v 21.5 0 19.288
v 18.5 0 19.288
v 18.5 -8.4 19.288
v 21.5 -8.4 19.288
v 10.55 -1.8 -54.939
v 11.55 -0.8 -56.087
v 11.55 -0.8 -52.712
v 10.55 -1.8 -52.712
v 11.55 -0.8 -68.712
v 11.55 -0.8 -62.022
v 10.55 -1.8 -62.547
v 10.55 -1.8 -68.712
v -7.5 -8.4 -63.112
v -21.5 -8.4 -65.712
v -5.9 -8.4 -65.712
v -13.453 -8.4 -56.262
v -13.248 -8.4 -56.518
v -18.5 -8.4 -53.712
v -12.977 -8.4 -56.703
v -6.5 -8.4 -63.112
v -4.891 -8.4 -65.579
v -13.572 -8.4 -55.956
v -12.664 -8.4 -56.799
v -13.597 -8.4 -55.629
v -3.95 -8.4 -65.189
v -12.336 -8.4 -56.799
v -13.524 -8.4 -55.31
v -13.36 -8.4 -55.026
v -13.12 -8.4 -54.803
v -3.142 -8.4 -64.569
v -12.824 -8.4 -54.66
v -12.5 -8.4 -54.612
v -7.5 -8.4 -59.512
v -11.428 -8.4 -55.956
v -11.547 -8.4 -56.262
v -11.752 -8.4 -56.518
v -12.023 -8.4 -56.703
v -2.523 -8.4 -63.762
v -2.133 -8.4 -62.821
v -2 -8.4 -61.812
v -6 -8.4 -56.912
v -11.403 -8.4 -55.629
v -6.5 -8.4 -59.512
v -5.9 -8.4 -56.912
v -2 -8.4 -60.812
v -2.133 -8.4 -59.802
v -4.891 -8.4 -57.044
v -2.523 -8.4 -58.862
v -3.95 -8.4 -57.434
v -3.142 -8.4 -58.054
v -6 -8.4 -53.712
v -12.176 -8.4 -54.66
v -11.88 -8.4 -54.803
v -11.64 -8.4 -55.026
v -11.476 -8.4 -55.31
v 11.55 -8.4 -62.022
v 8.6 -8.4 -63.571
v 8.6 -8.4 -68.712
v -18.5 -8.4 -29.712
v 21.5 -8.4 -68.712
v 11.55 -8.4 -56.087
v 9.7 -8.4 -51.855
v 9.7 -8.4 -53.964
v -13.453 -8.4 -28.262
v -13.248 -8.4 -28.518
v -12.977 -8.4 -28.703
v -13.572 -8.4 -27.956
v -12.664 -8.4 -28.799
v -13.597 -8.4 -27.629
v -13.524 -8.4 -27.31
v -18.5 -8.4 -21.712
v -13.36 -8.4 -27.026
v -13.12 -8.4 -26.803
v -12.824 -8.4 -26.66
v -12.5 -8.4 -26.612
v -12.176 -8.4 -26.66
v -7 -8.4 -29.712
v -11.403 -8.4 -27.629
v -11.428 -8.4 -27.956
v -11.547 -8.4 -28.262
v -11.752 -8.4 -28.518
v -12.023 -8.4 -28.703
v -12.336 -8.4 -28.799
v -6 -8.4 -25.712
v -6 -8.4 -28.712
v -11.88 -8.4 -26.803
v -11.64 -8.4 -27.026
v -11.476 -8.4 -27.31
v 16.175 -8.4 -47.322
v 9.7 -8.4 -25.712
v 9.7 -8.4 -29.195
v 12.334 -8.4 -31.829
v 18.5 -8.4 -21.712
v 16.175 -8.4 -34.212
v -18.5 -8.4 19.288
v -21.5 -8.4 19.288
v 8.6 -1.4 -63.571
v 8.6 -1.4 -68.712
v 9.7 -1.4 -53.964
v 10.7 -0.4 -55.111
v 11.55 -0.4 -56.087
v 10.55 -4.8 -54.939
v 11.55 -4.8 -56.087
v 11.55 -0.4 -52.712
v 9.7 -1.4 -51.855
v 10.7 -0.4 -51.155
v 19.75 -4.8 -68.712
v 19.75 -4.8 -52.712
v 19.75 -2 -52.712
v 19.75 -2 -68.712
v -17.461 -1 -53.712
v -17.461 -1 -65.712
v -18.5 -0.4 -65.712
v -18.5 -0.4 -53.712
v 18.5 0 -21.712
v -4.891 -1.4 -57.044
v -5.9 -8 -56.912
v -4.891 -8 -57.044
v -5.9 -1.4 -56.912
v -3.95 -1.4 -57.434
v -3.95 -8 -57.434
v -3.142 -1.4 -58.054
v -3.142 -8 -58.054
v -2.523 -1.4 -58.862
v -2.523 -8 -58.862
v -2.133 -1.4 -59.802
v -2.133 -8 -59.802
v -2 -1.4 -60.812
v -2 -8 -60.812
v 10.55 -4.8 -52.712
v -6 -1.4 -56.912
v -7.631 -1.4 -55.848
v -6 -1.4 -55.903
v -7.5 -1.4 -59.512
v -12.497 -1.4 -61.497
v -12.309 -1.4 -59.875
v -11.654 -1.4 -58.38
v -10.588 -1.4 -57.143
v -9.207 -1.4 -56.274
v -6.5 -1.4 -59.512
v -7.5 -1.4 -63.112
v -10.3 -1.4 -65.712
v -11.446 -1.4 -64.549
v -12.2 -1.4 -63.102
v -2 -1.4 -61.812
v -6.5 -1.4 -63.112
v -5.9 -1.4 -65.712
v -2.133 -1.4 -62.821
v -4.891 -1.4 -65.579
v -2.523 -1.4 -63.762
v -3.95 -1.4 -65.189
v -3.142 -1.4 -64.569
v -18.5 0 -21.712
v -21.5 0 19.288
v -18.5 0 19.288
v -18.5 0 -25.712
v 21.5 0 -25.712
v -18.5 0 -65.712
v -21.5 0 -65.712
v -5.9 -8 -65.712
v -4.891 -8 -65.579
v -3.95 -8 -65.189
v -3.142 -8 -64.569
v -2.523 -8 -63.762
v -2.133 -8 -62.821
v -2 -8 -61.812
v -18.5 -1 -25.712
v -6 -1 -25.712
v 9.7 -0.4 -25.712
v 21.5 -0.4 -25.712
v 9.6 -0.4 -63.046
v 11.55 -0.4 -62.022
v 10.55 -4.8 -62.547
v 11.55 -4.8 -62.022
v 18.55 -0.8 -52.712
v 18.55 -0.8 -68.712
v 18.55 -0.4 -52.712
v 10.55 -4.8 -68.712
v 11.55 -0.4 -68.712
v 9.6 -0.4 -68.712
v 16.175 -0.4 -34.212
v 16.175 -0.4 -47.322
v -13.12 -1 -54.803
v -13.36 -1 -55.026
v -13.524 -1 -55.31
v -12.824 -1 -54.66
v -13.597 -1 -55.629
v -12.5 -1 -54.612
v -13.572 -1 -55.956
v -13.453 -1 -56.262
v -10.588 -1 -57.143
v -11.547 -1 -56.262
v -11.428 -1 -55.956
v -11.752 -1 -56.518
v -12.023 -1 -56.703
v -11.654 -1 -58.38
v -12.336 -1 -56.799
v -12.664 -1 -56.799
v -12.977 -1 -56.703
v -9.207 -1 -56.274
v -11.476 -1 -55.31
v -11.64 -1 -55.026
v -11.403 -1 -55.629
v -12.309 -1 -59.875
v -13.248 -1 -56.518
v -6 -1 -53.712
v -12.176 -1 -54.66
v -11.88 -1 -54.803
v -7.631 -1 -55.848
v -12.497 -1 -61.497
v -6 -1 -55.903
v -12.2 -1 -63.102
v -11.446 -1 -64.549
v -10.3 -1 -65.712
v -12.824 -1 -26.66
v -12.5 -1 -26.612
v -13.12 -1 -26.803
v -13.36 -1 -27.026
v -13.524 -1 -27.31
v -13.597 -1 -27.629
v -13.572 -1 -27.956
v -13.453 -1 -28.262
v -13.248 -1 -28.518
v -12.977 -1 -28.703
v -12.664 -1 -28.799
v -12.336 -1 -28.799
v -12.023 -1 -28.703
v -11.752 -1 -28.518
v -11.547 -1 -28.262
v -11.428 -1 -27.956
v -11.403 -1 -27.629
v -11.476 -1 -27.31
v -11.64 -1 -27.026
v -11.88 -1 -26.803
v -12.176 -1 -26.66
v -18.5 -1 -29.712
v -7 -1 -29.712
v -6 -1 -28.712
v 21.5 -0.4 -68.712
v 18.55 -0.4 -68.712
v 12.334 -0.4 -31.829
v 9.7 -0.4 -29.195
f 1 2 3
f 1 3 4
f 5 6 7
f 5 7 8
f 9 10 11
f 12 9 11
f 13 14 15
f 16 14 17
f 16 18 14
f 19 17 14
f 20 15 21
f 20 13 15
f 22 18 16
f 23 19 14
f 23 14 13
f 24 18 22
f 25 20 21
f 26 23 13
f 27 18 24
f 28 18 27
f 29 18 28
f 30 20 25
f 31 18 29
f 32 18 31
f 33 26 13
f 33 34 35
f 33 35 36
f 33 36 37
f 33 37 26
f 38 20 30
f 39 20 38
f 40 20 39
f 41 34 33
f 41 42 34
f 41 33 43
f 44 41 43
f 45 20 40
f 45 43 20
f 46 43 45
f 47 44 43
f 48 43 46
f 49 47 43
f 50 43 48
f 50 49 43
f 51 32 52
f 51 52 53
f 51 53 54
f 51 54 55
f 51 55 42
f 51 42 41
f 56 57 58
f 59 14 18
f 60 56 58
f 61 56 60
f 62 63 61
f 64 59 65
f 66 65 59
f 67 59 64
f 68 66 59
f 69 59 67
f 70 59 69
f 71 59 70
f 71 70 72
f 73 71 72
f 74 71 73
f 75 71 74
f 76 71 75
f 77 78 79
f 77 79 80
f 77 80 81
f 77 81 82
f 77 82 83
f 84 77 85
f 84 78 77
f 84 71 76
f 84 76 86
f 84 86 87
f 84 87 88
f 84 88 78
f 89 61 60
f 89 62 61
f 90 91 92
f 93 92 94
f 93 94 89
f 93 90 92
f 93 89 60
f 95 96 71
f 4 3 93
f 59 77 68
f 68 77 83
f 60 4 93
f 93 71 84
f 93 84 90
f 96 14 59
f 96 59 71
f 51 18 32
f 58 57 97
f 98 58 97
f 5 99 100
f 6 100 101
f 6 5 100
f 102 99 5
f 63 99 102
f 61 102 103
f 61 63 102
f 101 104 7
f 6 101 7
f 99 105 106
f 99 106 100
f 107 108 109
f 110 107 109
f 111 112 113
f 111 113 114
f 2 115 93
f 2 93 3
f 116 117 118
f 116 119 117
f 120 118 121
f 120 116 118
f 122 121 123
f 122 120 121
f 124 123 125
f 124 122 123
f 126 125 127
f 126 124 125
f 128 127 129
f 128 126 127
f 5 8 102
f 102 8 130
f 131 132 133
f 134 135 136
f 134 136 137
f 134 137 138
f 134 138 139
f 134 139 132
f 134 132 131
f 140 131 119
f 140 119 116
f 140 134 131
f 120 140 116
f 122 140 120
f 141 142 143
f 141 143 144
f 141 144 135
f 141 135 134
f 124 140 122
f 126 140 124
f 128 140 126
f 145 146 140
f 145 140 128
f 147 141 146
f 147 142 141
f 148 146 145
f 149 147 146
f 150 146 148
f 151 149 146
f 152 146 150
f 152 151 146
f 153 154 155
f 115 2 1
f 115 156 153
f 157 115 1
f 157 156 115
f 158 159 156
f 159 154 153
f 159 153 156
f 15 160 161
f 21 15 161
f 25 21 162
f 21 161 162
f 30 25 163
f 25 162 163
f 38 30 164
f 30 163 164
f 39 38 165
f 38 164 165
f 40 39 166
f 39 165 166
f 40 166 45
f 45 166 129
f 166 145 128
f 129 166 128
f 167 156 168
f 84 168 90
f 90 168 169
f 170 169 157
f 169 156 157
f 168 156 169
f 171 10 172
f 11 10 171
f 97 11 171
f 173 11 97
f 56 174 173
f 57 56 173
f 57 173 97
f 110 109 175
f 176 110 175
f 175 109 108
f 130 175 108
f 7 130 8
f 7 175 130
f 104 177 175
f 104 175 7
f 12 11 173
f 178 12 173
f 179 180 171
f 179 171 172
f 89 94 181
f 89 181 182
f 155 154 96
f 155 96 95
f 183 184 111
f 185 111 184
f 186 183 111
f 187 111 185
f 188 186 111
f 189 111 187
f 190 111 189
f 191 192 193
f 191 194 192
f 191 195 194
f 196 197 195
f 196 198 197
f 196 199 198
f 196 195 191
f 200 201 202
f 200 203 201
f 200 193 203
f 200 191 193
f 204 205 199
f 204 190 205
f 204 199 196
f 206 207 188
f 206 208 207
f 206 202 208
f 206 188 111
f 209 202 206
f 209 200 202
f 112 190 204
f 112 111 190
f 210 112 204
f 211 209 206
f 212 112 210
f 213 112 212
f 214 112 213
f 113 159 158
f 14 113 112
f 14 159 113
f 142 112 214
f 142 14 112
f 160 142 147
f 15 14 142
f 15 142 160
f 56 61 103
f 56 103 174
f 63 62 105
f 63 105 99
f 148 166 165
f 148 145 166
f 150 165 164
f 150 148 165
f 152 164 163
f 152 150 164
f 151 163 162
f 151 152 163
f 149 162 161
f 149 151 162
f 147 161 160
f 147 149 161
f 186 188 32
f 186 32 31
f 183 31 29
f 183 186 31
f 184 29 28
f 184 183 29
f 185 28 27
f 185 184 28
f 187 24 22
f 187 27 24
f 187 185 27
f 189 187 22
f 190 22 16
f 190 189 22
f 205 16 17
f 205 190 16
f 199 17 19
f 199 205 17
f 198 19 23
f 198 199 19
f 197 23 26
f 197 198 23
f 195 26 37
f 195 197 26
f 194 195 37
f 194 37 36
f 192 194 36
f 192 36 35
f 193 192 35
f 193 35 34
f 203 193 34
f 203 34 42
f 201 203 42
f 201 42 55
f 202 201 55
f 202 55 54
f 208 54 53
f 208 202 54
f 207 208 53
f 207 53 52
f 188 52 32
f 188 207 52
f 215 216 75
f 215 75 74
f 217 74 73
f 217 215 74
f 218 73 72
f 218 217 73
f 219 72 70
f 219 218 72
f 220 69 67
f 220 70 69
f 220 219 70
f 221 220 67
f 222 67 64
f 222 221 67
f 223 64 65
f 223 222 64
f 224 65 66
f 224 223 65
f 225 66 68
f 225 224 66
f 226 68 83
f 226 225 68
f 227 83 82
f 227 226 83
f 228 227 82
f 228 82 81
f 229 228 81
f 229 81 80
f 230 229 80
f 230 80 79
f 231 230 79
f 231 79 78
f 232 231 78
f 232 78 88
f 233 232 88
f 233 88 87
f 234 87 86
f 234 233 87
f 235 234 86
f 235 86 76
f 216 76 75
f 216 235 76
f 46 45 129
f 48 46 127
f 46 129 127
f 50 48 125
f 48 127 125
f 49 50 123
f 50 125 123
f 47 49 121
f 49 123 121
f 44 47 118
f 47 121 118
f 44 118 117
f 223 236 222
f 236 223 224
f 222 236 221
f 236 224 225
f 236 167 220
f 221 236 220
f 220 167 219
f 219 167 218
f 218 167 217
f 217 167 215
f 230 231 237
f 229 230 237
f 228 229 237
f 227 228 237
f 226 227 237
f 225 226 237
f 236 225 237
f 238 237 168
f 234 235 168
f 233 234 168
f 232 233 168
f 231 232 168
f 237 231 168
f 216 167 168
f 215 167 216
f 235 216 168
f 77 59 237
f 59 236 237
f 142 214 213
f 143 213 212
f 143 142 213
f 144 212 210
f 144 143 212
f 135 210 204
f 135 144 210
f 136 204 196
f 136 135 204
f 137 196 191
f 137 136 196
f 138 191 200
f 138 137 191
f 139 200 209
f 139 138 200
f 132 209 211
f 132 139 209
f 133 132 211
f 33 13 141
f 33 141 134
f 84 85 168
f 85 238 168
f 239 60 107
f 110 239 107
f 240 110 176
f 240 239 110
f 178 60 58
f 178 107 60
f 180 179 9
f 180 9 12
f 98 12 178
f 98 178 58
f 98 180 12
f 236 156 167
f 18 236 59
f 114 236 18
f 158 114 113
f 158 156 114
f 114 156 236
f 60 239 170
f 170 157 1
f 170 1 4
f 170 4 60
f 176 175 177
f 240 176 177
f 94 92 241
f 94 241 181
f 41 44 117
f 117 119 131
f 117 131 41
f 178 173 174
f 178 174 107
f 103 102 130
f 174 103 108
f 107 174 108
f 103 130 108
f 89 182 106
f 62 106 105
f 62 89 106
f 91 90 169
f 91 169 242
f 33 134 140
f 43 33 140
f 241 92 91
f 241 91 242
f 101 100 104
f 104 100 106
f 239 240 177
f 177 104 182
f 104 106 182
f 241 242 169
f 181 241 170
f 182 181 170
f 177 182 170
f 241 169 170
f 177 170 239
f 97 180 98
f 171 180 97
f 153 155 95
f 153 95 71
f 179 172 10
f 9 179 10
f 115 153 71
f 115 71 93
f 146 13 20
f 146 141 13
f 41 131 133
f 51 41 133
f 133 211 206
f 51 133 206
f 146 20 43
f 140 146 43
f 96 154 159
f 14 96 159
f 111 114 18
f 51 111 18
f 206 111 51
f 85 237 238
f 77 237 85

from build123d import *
from OCP.BRepFilletAPI import BRepFilletAPI_MakeChamfer

# Parameters (mm, degrees)
SKETCH1_W                       = 3
SKETCH1_H                       = 37
SKETCH1_H_2                     = 48
BOSS_EXTRUDE1_DEPTH             = 8
SKETCH4_W                       = 19.5
SKETCH4_H                       = 8.8
BOSS_EXTRUDE3_DEPTH             = 6.6
SERVO_HOLDER_DEPTH              = 0.4
SERVO_HOLDER_DEPTH_BACK         = 7
SKETCH3_W                       = 15.5
SKETCH3_H                       = 4
SKETCH3_R                       = 1.04
SKETCH5_W                       = 1
SKETCH5_H                       = 3.6
CUT_EXTRUDE2_DEPTH              = 70.647801738
SKETCH11_W                      = 43
SKETCH11_H                      = 4
BOSS_EXTRUDE9_DEPTH             = 8
BOSS_EXTRUDE9_DIRECTION_2_REACH = 71.601
SKETCH14_W                      = 12.223643904
SKETCH14_H                      = 44.979564252
CUT_EXTRUDE5_DEPTH              = 10
FILLET2_R                       = 3.9
CUT_EXTRUDE4_DEPTH              = 70.647801738
CUT_EXTRUDE4_DEPTH_BACK         = 70.647801738
SKETCH13_R                      = 1.1
SKETCH17_W                      = 12.9
SKETCH17_H                      = 8
BOSS_EXTRUDE11_DEPTH            = 27
BOSS_EXTRUDE12_DEPTH            = 16
SKETCH18_W                      = 1
SKETCH18_H                      = 3.6
SKETCH18_W_2                    = 3
SKETCH18_H_2                    = 24
SKETCH18_H_3                    = 41
BOSS_EXTRUDE13_DEPTH            = 0.4
CHAMFER14_SIZE                  = 1.2
CUT_EXTRUDE6_DEPTH              = 73.439806169
CUT_EXTRUDE6_DEPTH_BACK         = 73.439806169
SKETCH29_W                      = 8.885937164
SKETCH29_H                      = 8
BOSS_EXTRUDE20_DEPTH            = 0.4
CHAMFER23_SIZE                  = 1
CHAMFER24_SIZE                  = 1
CHAMFER24_SIZE2                 = 3.099667104
SKETCH26_R                      = 5.5
CUT_EXTRUDE8_DEPTH              = 10
CHAMFER25_SIZE                  = 0.6
CHAMFER25_SIZE2                 = 1.039230485


with BuildPart() as part:
    # Sketch1 → Boss-Extrude1 (new body)
    with BuildSketch(Plane(origin=(0, 0, 0), x_dir=(1, 0, 0), z_dir=(0, 1, 0))):
        with Locations((-20, -0.788461538)):
            Rectangle(SKETCH1_W, SKETCH1_H)
        with Locations((-20, 41.711538462)):
            Rectangle(SKETCH1_W, SKETCH1_H_2)
        with Locations((20, -0.788461538)):
            Rectangle(SKETCH1_W, SKETCH1_H)
        with Locations((20, 41.711538462)):
            Rectangle(SKETCH1_W, SKETCH1_H_2)
    extrude(amount=-BOSS_EXTRUDE1_DEPTH)

    # Sketch4 → Boss-Extrude3 (add)
    with BuildSketch(Plane.XZ.offset(8)):
        with Locations((-11.75, -61.311538462)):
            Rectangle(SKETCH4_W, SKETCH4_H)
    extrude(amount=-BOSS_EXTRUDE3_DEPTH)

    # Sketch3 → Servo Holder (add, two sides: drawn at the far end of the back side and taken through both)
    # profile 1 of 2: a face of its own
    with BuildSketch(Plane.XZ.offset(8).offset(-SERVO_HOLDER_DEPTH_BACK)):
        with Locations((-13.75, -55.711538462)):
            Rectangle(SKETCH3_W, SKETCH3_H)
        with Locations(Location((-12.5, -55.711538462, 0), (0, 0, 270))):
            Circle(SKETCH3_R, mode=Mode.SUBTRACT)
    # profile 2 of 2: a face of its own
    with BuildSketch(Plane.XZ.offset(8).offset(-SERVO_HOLDER_DEPTH_BACK)):
        with Locations((-13.75, -27.711538462)):
            Rectangle(SKETCH3_W, SKETCH3_H)
        with Locations(Location((-12.5, -27.711538462, 0), (0, 0, 90))):
            Circle(SKETCH3_R, mode=Mode.SUBTRACT)
    extrude(amount=SERVO_HOLDER_DEPTH + SERVO_HOLDER_DEPTH_BACK)

    # Sketch5 → Cut-Extrude2 (cut, through all)
    with BuildSketch(Plane(origin=(0, 0, 0), x_dir=(1, 0, 0), z_dir=(0, 1, 0))):
        with Locations((-7, 61.311538462)):
            Rectangle(SKETCH5_W, SKETCH5_H)
    extrude(amount=-CUT_EXTRUDE2_DEPTH, mode=Mode.SUBTRACT)

    # Sketch11 → Boss-Extrude9 (add)
    with BuildSketch(Plane.XZ.offset(8)):
        with Locations((0, -23.711538462)):
            Rectangle(SKETCH11_W, SKETCH11_H)
    extrude(amount=-BOSS_EXTRUDE9_DEPTH)

    # Boss-Extrude9 direction 2: up to this face of the body (flat: up to its plane)
    boss_extrude9_direction_2_end = Plane(part.part.faces().sort_by_distance((-13.822479257, -8.4, -55.711538462))[0])
    # Sketch11 → Boss-Extrude9 direction 2 (add, up to the picked face)
    with BuildSketch(Plane.XZ.offset(8), mode=Mode.PRIVATE) as boss_extrude9_direction_2_sk1:
        with Locations((0, -23.711538462)):
            Rectangle(SKETCH11_W, SKETCH11_H)
    boss_extrude9_direction_2_tool1 = split(extrude(boss_extrude9_direction_2_sk1.sketch, amount=BOSS_EXTRUDE9_DIRECTION_2_REACH, mode=Mode.PRIVATE), bisect_by=boss_extrude9_direction_2_end, keep=Keep.BOTH, mode=Mode.PRIVATE)
    add(boss_extrude9_direction_2_tool1.solids().sort_by(Axis((0, -8, -23.711538), (0, -1, 0)))[0])

    # Sketch14 → Cut-Extrude5 (cut)
    with BuildSketch(Plane.XZ.offset(8)):
        with Locations((24.611821952, -48.201320588)):
            Rectangle(SKETCH14_W, SKETCH14_H)
    extrude(amount=-CUT_EXTRUDE5_DEPTH, mode=Mode.SUBTRACT)

    # Fillet2
    fillet2_edges = [part.edges().sort_by_distance(p)[0] for p in [
        (-2, -4.7, -65.711538462),
        (-2, -4.7, -56.911538462),
    ]]
    fillet(fillet2_edges, radius=FILLET2_R)

    # Sketch13 → Cut-Extrude4 (cut, two sides: drawn at the far end of the back side and taken through both)
    with BuildSketch(Plane(origin=(0, -8.4, 0), x_dir=(-1, 0, 0), z_dir=(0, -1, 0)).offset(-CUT_EXTRUDE4_DEPTH_BACK)):
        with Locations(Location((12.5, 55.711538462, 0), (0, 0, 270))):
            Circle(SKETCH13_R)
        with Locations(Location((12.5, 27.711538462, 0), (0, 0, 270))):
            Circle(SKETCH13_R)
    extrude(amount=CUT_EXTRUDE4_DEPTH + CUT_EXTRUDE4_DEPTH_BACK, mode=Mode.SUBTRACT)

    # Sketch17 → Boss-Extrude11 (add)
    with BuildSketch(Plane(origin=(0, 0, -25.711538462), x_dir=(-1, 0, 0), z_dir=(0, 0, -1))):
        with Locations((-15.05, -4.4)):
            Rectangle(SKETCH17_W, SKETCH17_H)
    extrude(amount=BOSS_EXTRUDE11_DEPTH)

    # Sketch16 → Boss-Extrude12 (add)
    with BuildSketch(Plane(origin=(0, 0, -52.711538462), x_dir=(-1, 0, 0), z_dir=(0, 0, -1))):
        Polygon((-19.75, -2), (-18.55, -2), (-18.55, -0.4), (-21.5, -0.4), (-21.5, -8.4), (-8.6, -8.4), (-8.6, -0.4), (-11.55, -0.4), (-11.55, -2), (-10.55, -2), (-10.55, -4.8), (-19.75, -4.8), align=None)
    extrude(amount=BOSS_EXTRUDE12_DEPTH)

    # Sketch18 → Boss-Extrude13 (add)
    # profile 1 of 4: a face of its own
    with BuildSketch(Plane.XZ.offset(8)):
        with BuildLine():
            Line((-21.5, -57.711538462), (-21.5, -65.711538462))
            Line((-21.5, -65.711538462), (-5.9, -65.711538462))
            ThreePointArc((-5.9, -65.711538462), (-3.142283553, -64.569254908), (-2, -61.811538462))
            Line((-2, -61.811538462), (-2, -60.811538462))
            ThreePointArc((-2, -60.811538462), (-3.142283553, -58.053822015), (-5.9, -56.911538462))
            Line((-5.9, -56.911538462), (-6, -56.911538462))
            Line((-6, -56.911538462), (-6, -57.711538462))
            Line((-6, -57.711538462), (-21.5, -57.711538462))
        make_face()
        with Locations((-7, -61.311538462)):
            Rectangle(SKETCH18_W, SKETCH18_H, mode=Mode.SUBTRACT)
    # profile 2 of 4: a face of its own
    with BuildSketch(Plane.XZ.offset(8)):
        with Locations((-20, -41.711538462)):
            Rectangle(SKETCH18_W_2, SKETCH18_H_2)
    # profile 3 of 4: a face of its own
    with BuildSketch(Plane.XZ.offset(8)):
        with Locations((-20, -1.211538462)):
            Rectangle(SKETCH18_W_2, SKETCH18_H_3)
    # profile 4 of 4: a face of its own
    with BuildSketch(Plane.XZ.offset(8)):
        with Locations((20, -1.211538462)):
            Rectangle(SKETCH18_W_2, SKETCH18_H_3)
    extrude(amount=BOSS_EXTRUDE13_DEPTH)

    # Chamfer14
    # the kernel refuses this chamfer: 1.2 mm, written as the material it takes off along each edge
    with BuildSketch(Plane(origin=(18.55, -2, -52.711538462), x_dir=(0.9996219169112968, -0.027495876610586622, 0), z_dir=(0, 0, -1))) as chamfer14_piece_1_section:
        Polygon((CHAMFER14_SIZE * 0.999621916911, -CHAMFER14_SIZE * 0.0274958766106), (-CHAMFER14_SIZE * 0.0274958766106, -CHAMFER14_SIZE * 0.999621916911), (0, 0), align=None)
    chamfer14_piece_1 = extrude(amount=19.086019586, mode=Mode.PRIVATE)
    chamfer14_piece_1 = split(chamfer14_piece_1, bisect_by=Plane(origin=(19.75, -1.603515015, -62.254548254), z_dir=(-1, 0, 0)), keep=Keep.TOP, mode=Mode.PRIVATE)
    add(chamfer14_piece_1, mode=Mode.SUBTRACT)
    with BuildSketch(Plane(origin=(11.55, -2, -52.711538462), x_dir=(0.027495876610585914, 0.9996219169112968, 0), z_dir=(0, 0, -1))) as chamfer14_piece_2_section:
        Polygon((CHAMFER14_SIZE * 0.999621916911, -CHAMFER14_SIZE * 0.0274958766106), (-CHAMFER14_SIZE * 0.0274958766106, -CHAMFER14_SIZE * 0.999621916911), (0, 0), align=None)
    chamfer14_piece_2 = extrude(amount=19.086019586, mode=Mode.PRIVATE)
    chamfer14_piece_2 = split(chamfer14_piece_2, bisect_by=Plane(origin=(10.55, -1.589568171, -62.254548254), z_dir=(1, 0, 0)), keep=Keep.TOP, mode=Mode.PRIVATE)
    add(chamfer14_piece_2, mode=Mode.SUBTRACT)

    # Sketch20 → Cut-Extrude6 (cut, two sides: drawn at the far end of the back side and taken through both)
    with BuildSketch(Plane(origin=(0, -0.4, 0), x_dir=(1, 0, 0), z_dir=(0, 1, 0)).offset(-CUT_EXTRUDE6_DEPTH_BACK)):
        Polygon((8.6, 53.963605621), (8.6, 63.570761525), (2.515498959, 66.765310983), (1.997773223, 58.659131413), (1.997773223, 53.963605621), (4.974693998, 53.963605621), (4.974693998, 55.162371456), (6.687222193, 53.963605621), align=None)
        Polygon((8.6, 52.700948092), (8.6, 53.963605621), (6.687222193, 53.963605621), (8.558718605, 52.653562397), align=None)
        Polygon((16.174786864, 47.322331969), (9.7, 51.854668021), (9.7, 30.195176122), (16.174786864, 34.211808124), align=None)
        Polygon((4.974693998, 53.963605621), (6.687222193, 53.963605621), (4.974693998, 55.162371456), align=None)
        Polygon((11.55, 56.087166011), (11.55, 62.021921145), (8.6, 63.570761525), (8.6, 53.963605621), (9.7, 53.963605621), align=None)
        Polygon((8.6, 52.624665515), (8.6, 52.700948092), (8.558718605, 52.653562397), align=None)
        Polygon((9.7, 25.711538462), (9.7, 30.195176122), (8.6, 29.512791467), (8.6, 25.711538462), align=None)
        Polygon((9.7, 53.963605621), (8.6, 53.963605621), (8.6, 52.700948092), align=None)
        Polygon((9.7, 51.854668021), (9.7, 53.963605621), (8.6, 52.700948092), (8.6, 52.624665515), align=None)
        Polygon((8.558718605, 52.653562397), (6.687222193, 53.963605621), (4.974693998, 53.963605621), (4.974693998, 48.539566347), align=None)
        Polygon((9.7, 30.195176122), (9.7, 51.854668021), (8.6, 52.624665515), (8.6, 29.512791467), align=None)
        Polygon((8.6, 52.624665515), (8.558718605, 52.653562397), (4.974693998, 48.539566347), (4.974693998, 27.263834025), (8.6, 29.512791467), align=None)
    extrude(amount=CUT_EXTRUDE6_DEPTH + CUT_EXTRUDE6_DEPTH_BACK, mode=Mode.SUBTRACT)

    # Sketch29 → Boss-Extrude20 (add)
    with BuildSketch(Plane(origin=(0, -1.4, 0), x_dir=(1, 0, 0), z_dir=(0, 1, 0))):
        with Locations((-14.057031418, 61.711538462)):
            Rectangle(SKETCH29_W, SKETCH29_H)
    extrude(amount=BOSS_EXTRUDE20_DEPTH)

    # Chamfer23
    chamfer23_edges = [part.edges().sort_by_distance(p)[0] for p in [
        (9.7, -0.4, -52.909136821),
    ]]
    chamfer(chamfer23_edges, length=CHAMFER23_SIZE)

    # Chamfer24: one chamfer whose edges measure the first distance from different faces: ONE call of the kernel's chamfer builder (chamfer() names one face for all edges)
    chamfer24_edges_1 = [part.edges().sort_by_distance(p)[0] for p in [
        (8.6, -0.4, -66.141149993),
        (-6, -4.7, -29.711538462),
    ]]
    chamfer24_edges_2 = [part.edges().sort_by_distance(p)[0] for p in [
        (9.7, -4.4, -30.195176122),
    ]]
    chamfer24_side_2 = [part.faces().sort_by_distance(p)[0] for p in [
        (9.7, -4.4, -27.953357292),
    ]]
    chamfer24 = BRepFilletAPI_MakeChamfer(part.part.solid().wrapped)
    for e in chamfer24_edges_1:
        chamfer24.Add(CHAMFER24_SIZE, e.wrapped)
    for e in chamfer24_edges_2:
        chamfer24.Add(CHAMFER24_SIZE, CHAMFER24_SIZE2, e.wrapped, chamfer24_side_2[0].wrapped)  # the first distance lies on this face
    add(Compound.cast(chamfer24.Shape()), mode=Mode.REPLACE)

    # Sketch26 → Cut-Extrude8 (cut)
    with BuildSketch(Plane(origin=(0, -1.4, 0), x_dir=(1, 0, 0), z_dir=(0, 1, 0))):
        with Locations((-7, 61.311538462)):
            Circle(SKETCH26_R)
    extrude(amount=CUT_EXTRUDE8_DEPTH, mode=Mode.SUBTRACT)

    # Chamfer25
    chamfer25_edges = [part.edges().sort_by_distance(p)[0] for p in [
        (-18.5, -1, -59.711538462),
    ]]
    chamfer25_side = [part.faces().sort_by_distance(p)[0] for p in [
        (-18.5, -3.927941176, -42.446832579),
    ]]
    chamfer(chamfer25_edges, length=CHAMFER25_SIZE, length2=CHAMFER25_SIZE2, reference=chamfer25_side[0])


solid = part.part
